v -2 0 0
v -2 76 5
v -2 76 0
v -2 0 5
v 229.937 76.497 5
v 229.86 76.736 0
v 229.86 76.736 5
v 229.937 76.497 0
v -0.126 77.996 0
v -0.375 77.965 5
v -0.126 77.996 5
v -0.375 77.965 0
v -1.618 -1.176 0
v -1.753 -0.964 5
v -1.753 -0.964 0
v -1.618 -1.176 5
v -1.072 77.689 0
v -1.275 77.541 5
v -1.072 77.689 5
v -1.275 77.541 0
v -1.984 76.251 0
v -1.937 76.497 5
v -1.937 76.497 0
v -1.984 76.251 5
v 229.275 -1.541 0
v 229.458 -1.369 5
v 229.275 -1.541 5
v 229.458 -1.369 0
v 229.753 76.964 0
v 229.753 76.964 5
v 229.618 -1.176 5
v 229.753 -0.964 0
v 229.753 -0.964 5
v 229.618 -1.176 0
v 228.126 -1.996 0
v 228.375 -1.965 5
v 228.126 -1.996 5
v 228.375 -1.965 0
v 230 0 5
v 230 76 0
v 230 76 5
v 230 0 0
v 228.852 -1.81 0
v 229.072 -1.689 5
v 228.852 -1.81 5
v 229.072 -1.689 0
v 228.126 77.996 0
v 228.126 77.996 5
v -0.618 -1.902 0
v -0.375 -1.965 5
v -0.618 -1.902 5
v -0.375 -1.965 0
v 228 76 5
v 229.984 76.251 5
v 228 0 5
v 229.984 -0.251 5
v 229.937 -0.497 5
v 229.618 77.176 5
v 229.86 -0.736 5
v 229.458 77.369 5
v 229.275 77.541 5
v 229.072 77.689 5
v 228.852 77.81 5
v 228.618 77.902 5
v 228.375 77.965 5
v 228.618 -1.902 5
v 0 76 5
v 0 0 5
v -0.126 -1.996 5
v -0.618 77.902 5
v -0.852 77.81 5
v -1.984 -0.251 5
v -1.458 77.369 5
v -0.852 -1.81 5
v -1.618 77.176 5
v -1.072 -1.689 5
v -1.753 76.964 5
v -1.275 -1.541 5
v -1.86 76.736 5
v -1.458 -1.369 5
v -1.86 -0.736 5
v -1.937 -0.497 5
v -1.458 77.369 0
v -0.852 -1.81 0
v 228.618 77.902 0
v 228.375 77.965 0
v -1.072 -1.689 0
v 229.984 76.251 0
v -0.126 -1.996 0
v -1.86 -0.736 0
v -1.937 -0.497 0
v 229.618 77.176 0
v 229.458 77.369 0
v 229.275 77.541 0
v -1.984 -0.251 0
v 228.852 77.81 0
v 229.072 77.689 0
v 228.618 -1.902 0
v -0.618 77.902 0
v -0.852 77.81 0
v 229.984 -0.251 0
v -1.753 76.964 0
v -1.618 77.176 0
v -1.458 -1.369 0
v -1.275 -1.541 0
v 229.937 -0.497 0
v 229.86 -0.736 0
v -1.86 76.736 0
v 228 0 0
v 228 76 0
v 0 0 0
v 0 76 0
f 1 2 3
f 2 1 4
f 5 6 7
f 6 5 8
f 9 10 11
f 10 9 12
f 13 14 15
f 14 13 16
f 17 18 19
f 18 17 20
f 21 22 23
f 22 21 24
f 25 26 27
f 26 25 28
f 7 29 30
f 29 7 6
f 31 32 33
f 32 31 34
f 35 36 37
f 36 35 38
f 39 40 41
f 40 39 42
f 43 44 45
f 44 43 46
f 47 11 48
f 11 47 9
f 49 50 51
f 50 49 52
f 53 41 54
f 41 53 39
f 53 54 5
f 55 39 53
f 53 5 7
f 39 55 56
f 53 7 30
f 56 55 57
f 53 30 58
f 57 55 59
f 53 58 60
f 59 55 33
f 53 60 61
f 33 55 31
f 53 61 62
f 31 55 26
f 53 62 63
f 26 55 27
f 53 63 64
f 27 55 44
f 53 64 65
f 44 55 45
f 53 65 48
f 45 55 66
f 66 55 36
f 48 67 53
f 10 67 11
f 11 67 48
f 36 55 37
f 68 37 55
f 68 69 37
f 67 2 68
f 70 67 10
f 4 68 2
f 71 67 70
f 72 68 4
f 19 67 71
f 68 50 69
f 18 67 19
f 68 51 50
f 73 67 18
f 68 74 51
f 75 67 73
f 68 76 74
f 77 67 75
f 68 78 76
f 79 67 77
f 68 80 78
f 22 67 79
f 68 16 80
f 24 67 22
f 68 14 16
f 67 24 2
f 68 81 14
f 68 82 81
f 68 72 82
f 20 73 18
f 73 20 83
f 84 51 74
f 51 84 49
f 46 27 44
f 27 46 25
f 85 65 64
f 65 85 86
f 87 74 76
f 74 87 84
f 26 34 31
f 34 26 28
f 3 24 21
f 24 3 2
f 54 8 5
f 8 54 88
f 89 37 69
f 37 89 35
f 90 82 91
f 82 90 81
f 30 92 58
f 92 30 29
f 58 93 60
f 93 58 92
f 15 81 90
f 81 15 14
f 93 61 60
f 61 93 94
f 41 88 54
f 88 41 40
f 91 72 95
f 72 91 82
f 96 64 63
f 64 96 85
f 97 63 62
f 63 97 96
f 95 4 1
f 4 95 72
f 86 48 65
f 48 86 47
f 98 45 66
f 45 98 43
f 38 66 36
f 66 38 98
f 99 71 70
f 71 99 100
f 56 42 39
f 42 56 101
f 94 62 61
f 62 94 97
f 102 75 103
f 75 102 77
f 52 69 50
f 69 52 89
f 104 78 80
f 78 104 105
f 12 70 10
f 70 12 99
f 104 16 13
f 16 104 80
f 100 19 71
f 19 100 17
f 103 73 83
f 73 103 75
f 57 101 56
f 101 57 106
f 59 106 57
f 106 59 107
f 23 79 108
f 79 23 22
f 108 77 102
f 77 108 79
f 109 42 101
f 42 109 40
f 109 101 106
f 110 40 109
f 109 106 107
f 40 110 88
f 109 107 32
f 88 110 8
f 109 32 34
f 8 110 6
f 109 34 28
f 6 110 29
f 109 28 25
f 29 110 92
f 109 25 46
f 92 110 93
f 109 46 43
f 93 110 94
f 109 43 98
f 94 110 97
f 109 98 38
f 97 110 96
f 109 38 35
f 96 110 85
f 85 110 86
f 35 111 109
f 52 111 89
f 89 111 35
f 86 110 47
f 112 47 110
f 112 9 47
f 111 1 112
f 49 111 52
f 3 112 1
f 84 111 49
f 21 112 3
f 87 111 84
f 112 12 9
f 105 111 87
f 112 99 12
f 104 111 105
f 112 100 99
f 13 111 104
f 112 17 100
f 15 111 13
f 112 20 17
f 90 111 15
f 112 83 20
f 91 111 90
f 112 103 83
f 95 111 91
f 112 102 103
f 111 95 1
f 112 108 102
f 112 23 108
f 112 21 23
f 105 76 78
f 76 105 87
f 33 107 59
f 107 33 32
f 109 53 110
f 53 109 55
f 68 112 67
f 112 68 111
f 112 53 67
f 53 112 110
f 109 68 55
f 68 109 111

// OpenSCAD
// file: ../common/keyhole.scad
key_hole = 14;
key_holder = key_hole + (2.5 * 2) ;

module key_hole(row, column, plate_thickness = 2) {
    padding = key_holder / 2;
    translate([column * key_holder + padding, row * key_holder + padding, 0]) {
        difference() {
            cube([key_holder, key_holder, plate_thickness], true);
            cube([key_hole, key_hole, plate_thickness + 0.1], true);
        }
    }
}
// main file
include <../common/keyhole.scad>;

$fn = 50;
heigh = 4;

rows = 4;
cols = 12;

difference()
{
    minkowski()
    {
        cube([ cols * key_holder, rows * key_holder, heigh ]);
        cylinder(r = 2, h = 1);
    }
    cube([ cols * key_holder, rows * key_holder, heigh + 10 ]);
}
